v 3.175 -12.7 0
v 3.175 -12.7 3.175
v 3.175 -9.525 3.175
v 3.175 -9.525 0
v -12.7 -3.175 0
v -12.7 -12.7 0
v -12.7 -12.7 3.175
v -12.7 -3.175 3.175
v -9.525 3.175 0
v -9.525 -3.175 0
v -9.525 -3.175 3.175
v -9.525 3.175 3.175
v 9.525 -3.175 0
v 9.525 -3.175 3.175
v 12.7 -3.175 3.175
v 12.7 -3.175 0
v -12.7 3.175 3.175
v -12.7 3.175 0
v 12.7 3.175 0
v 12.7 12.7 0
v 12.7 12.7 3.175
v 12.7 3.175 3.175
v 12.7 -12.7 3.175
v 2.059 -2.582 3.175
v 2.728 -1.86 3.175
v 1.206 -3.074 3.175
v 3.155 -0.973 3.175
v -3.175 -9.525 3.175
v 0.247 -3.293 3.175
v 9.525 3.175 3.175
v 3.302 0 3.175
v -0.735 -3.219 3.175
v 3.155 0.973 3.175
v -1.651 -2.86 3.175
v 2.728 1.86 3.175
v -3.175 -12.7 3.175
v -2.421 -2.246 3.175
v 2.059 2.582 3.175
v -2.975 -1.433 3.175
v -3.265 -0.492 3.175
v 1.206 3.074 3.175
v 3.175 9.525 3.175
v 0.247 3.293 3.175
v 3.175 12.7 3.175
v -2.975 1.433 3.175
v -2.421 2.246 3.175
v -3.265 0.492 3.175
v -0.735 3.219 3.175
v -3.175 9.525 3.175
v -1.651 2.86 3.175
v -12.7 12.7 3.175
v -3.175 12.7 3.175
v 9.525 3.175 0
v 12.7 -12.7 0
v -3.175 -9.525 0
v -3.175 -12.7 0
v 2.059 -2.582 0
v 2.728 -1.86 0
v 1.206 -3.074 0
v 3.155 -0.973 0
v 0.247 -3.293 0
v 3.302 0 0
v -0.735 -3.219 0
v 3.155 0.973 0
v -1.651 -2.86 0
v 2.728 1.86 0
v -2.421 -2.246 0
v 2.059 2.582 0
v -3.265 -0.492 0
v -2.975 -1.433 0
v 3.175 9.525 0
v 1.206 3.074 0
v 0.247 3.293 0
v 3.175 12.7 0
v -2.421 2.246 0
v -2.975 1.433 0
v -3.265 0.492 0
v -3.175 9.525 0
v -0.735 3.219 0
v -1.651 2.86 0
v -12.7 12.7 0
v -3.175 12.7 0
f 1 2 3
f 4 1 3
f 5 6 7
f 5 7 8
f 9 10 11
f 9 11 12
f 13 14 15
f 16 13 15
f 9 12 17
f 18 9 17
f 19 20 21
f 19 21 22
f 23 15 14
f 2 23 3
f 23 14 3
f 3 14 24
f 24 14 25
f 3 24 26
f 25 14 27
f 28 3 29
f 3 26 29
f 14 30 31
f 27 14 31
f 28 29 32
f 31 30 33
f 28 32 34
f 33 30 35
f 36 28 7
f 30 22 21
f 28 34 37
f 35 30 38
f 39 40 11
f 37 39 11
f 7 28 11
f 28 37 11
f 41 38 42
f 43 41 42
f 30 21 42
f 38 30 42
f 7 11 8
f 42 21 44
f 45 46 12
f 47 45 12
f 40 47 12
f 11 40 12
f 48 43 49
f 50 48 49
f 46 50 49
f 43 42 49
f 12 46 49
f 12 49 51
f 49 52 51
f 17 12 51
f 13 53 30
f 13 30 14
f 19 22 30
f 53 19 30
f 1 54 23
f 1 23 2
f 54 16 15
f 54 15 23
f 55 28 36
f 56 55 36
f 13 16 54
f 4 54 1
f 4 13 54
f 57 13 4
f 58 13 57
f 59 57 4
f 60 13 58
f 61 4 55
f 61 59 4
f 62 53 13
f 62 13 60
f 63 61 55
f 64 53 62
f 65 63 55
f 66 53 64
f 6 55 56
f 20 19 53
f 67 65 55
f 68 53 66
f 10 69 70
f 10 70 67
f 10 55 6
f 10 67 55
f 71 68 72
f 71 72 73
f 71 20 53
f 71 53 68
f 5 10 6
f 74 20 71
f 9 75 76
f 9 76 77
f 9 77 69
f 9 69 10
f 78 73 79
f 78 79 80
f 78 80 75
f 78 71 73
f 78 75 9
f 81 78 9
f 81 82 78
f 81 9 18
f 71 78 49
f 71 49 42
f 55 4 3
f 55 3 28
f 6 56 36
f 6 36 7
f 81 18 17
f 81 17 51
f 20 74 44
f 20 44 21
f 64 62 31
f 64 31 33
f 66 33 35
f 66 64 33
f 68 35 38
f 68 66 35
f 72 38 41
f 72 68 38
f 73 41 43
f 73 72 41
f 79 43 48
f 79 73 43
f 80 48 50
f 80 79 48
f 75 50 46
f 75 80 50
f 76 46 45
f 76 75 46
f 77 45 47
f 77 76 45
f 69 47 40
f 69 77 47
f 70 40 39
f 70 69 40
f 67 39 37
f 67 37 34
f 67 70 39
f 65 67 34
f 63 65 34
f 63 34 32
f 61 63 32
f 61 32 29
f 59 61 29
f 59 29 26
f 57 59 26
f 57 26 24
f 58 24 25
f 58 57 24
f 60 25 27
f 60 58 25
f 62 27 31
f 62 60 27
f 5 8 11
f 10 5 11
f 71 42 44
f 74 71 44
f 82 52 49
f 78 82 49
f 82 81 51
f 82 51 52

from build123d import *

# Parameters (mm, degrees)
SKETCH1_R      = 3.302
EXTRUDE1_DEPTH = 3.175


with BuildPart() as part:
    # Sketch1 → Extrude1 (new body)
    with BuildSketch(Plane.XY):
        Polygon((-12.7, 12.7), (-3.175, 12.7), (-3.175, 9.525), (3.175, 9.525), (3.175, 12.7), (12.7, 12.7), (12.7, 3.175), (9.525, 3.175), (9.525, -3.175), (12.7, -3.175), (12.7, -12.7), (3.175, -12.7), (3.175, -9.525), (-3.175, -9.525), (-3.175, -12.7), (-12.7, -12.7), (-12.7, -3.175), (-9.525, -3.175), (-9.525, 3.175), (-12.7, 3.175), align=None)
        Circle(SKETCH1_R, mode=Mode.SUBTRACT)
    extrude(amount=EXTRUDE1_DEPTH)


solid = part.part
